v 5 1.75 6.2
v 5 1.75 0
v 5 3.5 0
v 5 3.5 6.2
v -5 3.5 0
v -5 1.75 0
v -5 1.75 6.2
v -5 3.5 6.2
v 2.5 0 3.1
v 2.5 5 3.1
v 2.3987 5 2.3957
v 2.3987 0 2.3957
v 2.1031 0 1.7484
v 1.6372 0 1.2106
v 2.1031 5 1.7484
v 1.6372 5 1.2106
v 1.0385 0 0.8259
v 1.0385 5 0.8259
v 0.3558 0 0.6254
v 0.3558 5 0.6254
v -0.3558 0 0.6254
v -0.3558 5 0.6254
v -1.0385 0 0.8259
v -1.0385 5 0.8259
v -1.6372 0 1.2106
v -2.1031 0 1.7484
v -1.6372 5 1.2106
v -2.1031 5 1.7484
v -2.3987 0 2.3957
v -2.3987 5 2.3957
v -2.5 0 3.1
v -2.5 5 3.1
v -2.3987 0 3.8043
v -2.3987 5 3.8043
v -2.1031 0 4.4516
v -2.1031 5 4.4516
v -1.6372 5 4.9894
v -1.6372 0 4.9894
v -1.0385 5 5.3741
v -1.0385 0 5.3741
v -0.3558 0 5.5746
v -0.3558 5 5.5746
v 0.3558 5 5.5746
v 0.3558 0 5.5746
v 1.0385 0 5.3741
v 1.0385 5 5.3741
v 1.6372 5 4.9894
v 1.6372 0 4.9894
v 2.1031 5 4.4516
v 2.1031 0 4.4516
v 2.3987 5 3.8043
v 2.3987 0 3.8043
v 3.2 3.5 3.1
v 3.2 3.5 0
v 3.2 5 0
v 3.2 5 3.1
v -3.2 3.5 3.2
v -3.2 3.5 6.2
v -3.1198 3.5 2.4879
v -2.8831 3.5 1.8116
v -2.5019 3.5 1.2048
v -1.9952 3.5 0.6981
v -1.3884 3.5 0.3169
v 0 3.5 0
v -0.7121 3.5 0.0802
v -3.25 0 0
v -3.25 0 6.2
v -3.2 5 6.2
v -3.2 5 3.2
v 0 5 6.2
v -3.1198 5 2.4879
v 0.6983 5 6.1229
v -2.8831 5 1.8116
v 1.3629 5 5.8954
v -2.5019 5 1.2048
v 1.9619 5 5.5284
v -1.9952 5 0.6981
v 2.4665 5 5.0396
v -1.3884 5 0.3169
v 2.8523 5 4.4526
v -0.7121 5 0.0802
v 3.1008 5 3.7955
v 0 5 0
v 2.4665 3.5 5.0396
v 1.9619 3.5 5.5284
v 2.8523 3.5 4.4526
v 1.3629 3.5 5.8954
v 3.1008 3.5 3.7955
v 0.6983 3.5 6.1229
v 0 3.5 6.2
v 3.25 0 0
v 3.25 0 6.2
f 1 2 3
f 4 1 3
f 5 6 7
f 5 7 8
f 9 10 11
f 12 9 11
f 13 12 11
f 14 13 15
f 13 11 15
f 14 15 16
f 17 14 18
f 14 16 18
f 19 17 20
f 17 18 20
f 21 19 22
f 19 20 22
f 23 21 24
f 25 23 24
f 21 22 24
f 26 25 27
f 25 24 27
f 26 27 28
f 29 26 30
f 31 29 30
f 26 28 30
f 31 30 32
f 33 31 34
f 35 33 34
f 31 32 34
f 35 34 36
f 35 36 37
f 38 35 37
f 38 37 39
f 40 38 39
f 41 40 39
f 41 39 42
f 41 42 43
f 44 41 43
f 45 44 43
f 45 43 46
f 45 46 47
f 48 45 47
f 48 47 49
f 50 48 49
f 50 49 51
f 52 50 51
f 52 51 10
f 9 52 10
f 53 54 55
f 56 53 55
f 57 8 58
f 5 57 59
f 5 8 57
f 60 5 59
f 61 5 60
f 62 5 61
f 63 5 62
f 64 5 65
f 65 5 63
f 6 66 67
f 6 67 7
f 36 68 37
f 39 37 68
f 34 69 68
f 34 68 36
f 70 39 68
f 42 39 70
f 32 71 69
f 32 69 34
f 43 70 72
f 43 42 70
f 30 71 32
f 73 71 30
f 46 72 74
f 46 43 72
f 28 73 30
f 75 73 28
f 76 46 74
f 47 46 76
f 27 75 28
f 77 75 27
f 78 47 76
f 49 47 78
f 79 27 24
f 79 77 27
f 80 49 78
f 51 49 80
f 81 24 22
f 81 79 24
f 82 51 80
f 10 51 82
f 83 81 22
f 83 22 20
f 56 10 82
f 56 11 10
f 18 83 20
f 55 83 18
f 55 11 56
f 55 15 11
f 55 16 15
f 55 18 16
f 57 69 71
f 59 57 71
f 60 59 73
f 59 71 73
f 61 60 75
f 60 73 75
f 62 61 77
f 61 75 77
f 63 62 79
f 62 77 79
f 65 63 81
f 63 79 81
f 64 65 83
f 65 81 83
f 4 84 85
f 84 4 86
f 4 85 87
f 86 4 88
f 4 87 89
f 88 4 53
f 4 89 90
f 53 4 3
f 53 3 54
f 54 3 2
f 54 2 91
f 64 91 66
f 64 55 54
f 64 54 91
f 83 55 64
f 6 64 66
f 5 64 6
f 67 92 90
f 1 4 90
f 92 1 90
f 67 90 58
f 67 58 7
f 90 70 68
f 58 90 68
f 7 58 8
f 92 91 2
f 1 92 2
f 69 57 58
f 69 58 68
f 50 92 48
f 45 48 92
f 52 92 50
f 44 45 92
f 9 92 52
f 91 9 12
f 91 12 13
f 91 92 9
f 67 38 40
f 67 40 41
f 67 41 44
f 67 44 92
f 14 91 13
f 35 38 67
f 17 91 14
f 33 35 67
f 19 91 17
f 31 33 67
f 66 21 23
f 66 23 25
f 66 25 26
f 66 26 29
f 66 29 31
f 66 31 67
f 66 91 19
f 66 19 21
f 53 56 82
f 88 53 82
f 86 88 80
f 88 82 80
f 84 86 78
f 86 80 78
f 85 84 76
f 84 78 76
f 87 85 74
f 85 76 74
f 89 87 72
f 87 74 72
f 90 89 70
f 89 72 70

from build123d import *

# Parameters (mm, degrees)
BOSS_EXTRUDE1_DEPTH = 6.2
SKETCH2_R           = 2.5
CUT_EXTRUDE1_DEPTH  = 8
CUT_EXTRUDE2_DEPTH  = 1.5


with BuildPart() as part:
    # Sketch1 → Boss-Extrude1 (new body)
    with BuildSketch(Plane.XY):
        Polygon((0, 5), (0, 0), (3.25, 0), (5, 1.75), (5, 3.5), (3.2, 3.5), (3.2, 5), align=None)
    extrude(amount=BOSS_EXTRUDE1_DEPTH)

    # Mirror1: part across plane


with BuildPart() as part_1:
    add(part.part)
    add(part.part.mirror(Plane(origin=(0, 0, 0), x_dir=(0, 0, 1), z_dir=(1, 0, 0))))

    # Sketch2 → Cut-Extrude1 (cut)
    with BuildSketch(Plane(origin=(0, 5, 0), x_dir=(1, 0, 0), z_dir=(0, 1, 0))):
        with Locations((0, -3.1)):
            Circle(SKETCH2_R)
    extrude(amount=-CUT_EXTRUDE1_DEPTH, mode=Mode.SUBTRACT)

    # Sketch3 → Cut-Extrude2 (cut)
    with BuildSketch(Plane(origin=(0, 5, 0), x_dir=(1, 0, 0), z_dir=(0, 1, 0))):
        with BuildLine():
            ThreePointArc((3.2, -3.1), (2.227666941, -5.297914262), (0, -6.2))
            Line((0, -6.2), (3.2, -6.2))
            Line((3.2, -6.2), (3.2, -3.1))
        make_face()
        with BuildLine():
            Line((-3.2, 0), (-3.2, -3.2))
            ThreePointArc((-3.2, -3.2), (-2.2627417, -0.9372583), (0, 0))
            Line((0, 0), (-3.2, 0))
        make_face()
    extrude(amount=-CUT_EXTRUDE2_DEPTH, mode=Mode.SUBTRACT)


solid = part_1.part
